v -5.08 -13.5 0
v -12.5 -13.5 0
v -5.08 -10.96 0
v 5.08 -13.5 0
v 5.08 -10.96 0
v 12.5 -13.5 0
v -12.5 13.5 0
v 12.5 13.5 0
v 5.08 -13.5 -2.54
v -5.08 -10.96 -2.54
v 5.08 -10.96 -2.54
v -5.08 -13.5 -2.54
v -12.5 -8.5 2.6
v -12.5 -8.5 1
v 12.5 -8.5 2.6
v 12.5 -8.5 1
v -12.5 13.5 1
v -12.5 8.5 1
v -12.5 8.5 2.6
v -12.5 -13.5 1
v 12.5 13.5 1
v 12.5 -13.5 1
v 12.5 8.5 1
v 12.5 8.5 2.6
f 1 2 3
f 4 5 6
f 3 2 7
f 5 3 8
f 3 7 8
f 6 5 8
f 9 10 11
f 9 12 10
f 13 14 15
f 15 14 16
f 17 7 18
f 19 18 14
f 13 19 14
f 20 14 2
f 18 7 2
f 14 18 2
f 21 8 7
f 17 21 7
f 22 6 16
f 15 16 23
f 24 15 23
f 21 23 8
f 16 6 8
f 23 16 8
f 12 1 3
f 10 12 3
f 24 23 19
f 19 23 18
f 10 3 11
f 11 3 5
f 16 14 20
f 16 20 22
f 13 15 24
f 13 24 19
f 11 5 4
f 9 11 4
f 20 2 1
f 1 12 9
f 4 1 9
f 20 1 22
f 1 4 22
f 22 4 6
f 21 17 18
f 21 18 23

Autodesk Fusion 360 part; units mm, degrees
sketch "Sketch1" plane through (0, 0, 0) normal (0, 0, 1) x (1, 0, 0)
  line L0 (12.5, 13.5) -> (-12.5, 13.5)
  line L1 (-12.5, 13.5) -> (-12.5, -13.5)
  line L2 (-12.5, -13.5) -> (12.5, -13.5)
  line L3 (12.5, -13.5) -> (12.5, 13.5)
  line L4 (12.5, -13.5) -> (-12.5, 13.5) construction
  dimension "d1" = 25
  dimension "d2" = 27
extrude "Extrude1" add sketch "Sketch1" along normal blind 1
sketch "Sketch2" plane through (0, 0, 0) normal (0, 0, -1) x (1, 0, 0)
  line L0 (12.5, -13.5) -> (12.5, 13.5)
  line L1 (12.5, 13.5) -> (-12.5, 13.5)
  line L2 (-12.5, 13.5) -> (-12.5, -13.5)
  line L3 (-12.5, -13.5) -> (12.5, -13.5)
  line L4 (-5.08, 10.96) -> (5.08, 10.96)
  line L5 (5.08, 10.96) -> (5.08, 13.5)
  line L6 (5.08, 13.5) -> (-5.08, 13.5)
  line L7 (-5.08, 13.5) -> (-5.08, 10.96)
  dimension "d5" = 2.54
  dimension "d6" = 10.16
extrude "Extrude2" add sketch "Sketch2" along normal blind 2.54 contours L1 L4 L5 L6 L7
sketch "Sketch3" plane through (0, 0, 1) normal (0, 0, 1) x (-1, 0, 0)
  line L0 (-12.5, 13.5) -> (-12.5, -13.5)
  line L1 (-12.5, -13.5) -> (12.5, -13.5)
  line L2 (12.5, -13.5) -> (12.5, 13.5)
  line L3 (12.5, 13.5) -> (-12.5, 13.5)
  line L4 (12.5, 8.5) -> (-12.5, 8.5)
  line L5 (-12.5, 8.5) -> (-12.5, -8.5)
  line L6 (-12.5, -8.5) -> (12.5, -8.5)
  line L7 (12.5, -8.5) -> (12.5, 8.5)
  line L8 (0, 8.5) -> (0, 13.5) construction
  dimension "d9" = 17
  dimension "d10" = 5
extrude "Extrude3" add sketch "Sketch3" along normal blind 1.6 contours L0 L2 L4 L5 L6 L7
